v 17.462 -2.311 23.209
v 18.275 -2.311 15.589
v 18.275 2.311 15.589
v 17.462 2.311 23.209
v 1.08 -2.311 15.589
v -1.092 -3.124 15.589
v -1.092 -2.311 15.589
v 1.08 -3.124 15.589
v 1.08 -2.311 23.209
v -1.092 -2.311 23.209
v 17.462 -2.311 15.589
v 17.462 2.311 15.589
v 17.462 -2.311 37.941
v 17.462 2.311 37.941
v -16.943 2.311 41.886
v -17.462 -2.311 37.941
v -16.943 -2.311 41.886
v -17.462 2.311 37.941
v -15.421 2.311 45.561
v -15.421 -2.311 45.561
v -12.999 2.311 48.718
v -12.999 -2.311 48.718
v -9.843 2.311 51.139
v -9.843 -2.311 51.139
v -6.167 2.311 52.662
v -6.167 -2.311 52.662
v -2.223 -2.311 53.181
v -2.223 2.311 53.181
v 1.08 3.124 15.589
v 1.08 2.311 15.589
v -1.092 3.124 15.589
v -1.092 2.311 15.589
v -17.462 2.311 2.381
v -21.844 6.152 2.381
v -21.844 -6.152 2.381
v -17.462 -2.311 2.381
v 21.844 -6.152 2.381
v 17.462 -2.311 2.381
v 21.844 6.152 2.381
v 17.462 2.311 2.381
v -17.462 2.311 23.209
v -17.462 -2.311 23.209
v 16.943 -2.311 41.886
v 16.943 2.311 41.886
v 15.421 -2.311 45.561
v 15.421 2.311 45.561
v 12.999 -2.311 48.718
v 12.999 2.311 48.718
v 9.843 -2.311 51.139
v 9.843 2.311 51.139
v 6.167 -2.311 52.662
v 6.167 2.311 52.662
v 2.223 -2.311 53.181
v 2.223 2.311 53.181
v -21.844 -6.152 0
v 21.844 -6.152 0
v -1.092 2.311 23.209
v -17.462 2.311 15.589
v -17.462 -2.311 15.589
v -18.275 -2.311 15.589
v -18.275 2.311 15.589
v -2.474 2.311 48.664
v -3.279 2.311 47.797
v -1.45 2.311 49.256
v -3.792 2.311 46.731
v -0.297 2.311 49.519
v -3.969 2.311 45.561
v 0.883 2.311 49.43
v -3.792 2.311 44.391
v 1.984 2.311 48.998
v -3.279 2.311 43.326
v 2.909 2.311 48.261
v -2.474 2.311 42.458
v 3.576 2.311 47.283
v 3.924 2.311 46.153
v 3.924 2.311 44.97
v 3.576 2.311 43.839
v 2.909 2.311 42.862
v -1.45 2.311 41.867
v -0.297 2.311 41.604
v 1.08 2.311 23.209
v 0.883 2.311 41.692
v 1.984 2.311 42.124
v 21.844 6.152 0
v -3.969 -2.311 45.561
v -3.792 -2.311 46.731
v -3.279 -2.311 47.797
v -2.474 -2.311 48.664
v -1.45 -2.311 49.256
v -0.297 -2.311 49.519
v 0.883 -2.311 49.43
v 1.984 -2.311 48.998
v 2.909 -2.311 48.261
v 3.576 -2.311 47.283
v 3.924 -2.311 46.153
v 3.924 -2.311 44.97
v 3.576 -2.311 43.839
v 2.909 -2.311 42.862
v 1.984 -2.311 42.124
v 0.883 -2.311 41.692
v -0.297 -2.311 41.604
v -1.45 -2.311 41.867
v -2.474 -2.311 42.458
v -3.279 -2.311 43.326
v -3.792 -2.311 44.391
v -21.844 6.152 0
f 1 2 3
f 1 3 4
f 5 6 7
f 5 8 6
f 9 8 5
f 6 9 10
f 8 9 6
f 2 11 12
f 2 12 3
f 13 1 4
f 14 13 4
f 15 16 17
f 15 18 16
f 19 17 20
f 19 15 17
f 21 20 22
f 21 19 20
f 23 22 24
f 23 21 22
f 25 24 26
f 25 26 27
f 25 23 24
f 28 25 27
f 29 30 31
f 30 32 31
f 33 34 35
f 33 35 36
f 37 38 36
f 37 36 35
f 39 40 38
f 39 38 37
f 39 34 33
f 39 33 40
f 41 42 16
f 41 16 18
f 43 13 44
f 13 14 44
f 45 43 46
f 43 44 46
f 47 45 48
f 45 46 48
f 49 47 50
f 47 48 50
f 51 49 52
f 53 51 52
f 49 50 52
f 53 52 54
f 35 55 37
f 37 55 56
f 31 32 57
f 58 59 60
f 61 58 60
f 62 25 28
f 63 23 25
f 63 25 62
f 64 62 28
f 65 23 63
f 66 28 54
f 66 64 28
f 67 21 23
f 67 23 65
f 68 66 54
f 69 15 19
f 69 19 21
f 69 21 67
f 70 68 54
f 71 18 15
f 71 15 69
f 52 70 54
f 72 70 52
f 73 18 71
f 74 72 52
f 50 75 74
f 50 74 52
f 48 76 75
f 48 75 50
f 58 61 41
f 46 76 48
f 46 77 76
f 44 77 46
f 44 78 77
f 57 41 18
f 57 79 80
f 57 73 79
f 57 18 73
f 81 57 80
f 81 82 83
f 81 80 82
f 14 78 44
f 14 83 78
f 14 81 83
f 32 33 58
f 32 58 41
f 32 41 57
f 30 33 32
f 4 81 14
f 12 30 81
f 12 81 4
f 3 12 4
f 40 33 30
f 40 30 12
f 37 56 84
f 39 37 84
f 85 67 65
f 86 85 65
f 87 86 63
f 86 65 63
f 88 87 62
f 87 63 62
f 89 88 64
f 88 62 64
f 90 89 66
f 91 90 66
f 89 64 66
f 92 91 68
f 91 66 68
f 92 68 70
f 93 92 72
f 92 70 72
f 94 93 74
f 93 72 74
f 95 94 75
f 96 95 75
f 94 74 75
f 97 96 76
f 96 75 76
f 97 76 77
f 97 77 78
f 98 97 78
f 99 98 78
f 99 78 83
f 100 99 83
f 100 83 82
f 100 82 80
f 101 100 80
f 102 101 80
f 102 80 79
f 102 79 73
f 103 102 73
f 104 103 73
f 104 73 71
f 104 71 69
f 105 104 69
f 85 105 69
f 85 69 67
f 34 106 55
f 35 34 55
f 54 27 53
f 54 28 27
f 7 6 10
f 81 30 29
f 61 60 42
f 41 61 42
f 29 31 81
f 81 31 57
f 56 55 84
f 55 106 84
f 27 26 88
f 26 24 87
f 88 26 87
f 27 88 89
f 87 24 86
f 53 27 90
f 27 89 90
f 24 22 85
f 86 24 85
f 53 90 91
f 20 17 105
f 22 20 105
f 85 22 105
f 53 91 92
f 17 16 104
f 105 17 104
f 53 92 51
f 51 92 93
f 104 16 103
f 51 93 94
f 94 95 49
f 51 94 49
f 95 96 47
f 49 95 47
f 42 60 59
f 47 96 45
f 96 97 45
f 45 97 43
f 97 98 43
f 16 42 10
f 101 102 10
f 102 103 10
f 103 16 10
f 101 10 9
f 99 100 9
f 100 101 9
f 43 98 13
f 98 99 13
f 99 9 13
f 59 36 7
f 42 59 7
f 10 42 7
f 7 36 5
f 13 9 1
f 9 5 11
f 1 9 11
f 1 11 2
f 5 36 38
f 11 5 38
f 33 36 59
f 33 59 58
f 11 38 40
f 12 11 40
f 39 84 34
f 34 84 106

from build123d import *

# Parameters (mm, degrees)
F1_DEPTH       = 2.38125
F2_W           = 34.925
F2_H           = 4.6228
F3_DEPTH       = 50.8
F4_R           = 15.24
F5_R           = 3.96875
F6_DEPTH       = 8.4639625
F8_DEPTH       = 4.6228
F11_DEPTH      = 1.0795
F11_DEPTH_BACK = 1.0922


with BuildPart() as f1:
    # F0 (on Top) → F1 (new body)
    with BuildSketch(Plane.XY):
        Polygon((-21.844, -6.1515625), (21.844, -6.1515625), (21.844, 6.1515625), (-21.844, 6.1515625), align=None)
    extrude(amount=F1_DEPTH)

    # F2 (on face) → F3 (join)
    with BuildSketch(Plane.XY.offset(2.38125)):
        Rectangle(F2_W, F2_H)
    extrude(amount=F3_DEPTH)

    # F4
    f4_edges = [f1.edges().sort_by_distance(p)[0] for p in [
        (-17.4625, 0, 53.18125),
        (17.4625, 0, 53.18125),
    ]]
    fillet(f4_edges, radius=F4_R)

    # F5 (on face) → F6 (cut, through all)
    with BuildSketch(Plane(origin=(0, 2.3114, 0), x_dir=(-1, 0, 0), z_dir=(0, 1, 0))):
        with Locations((0, 45.56125)):
            Circle(F5_R)
    extrude(amount=-F6_DEPTH, mode=Mode.SUBTRACT)

    # F7 (on face) → F8 (join, through all)
    with BuildSketch(Plane.XZ.offset(2.3114)):
        Polygon((18.2753, 15.58925), (17.4625, 23.20925), (17.4625, 15.58925), align=None)
    extrude(amount=-F8_DEPTH)

    # F9: F1 across plane


with BuildPart() as f1_1:
    add(f1.part)
    add(f1.part.mirror(Plane.YZ))

    # F10 (on Right) → F11 (join, two sides)
    with BuildSketch(Plane.YZ) as f11_sk:
        Polygon((-3.1242, 15.58925), (-2.3114, 15.58925), (-2.3114, 23.20925), align=None)
        Polygon((3.1242, 15.58925), (2.3114, 23.20925), (2.3114, 15.58925), align=None)
    extrude(amount=F11_DEPTH)
    extrude(f11_sk.sketch, amount=-F11_DEPTH_BACK)


solid = f1_1.part
